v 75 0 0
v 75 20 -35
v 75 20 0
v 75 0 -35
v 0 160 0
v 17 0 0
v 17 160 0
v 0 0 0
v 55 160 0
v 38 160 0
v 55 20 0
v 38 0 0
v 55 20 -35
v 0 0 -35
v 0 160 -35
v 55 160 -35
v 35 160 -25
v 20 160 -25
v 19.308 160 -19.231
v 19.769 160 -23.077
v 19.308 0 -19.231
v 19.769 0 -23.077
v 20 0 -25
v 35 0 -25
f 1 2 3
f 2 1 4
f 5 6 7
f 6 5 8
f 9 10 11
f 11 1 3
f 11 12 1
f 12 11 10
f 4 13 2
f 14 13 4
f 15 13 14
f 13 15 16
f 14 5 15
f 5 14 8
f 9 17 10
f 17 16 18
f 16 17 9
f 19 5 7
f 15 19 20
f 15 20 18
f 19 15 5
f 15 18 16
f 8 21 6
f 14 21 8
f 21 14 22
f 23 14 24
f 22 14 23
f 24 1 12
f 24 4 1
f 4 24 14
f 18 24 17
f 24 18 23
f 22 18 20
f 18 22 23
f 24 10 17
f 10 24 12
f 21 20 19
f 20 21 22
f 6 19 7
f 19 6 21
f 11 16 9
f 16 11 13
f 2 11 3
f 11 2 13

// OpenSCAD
mr = 40; // margin between the slot and the wall
ml = 20;
sw = 15; // slot width

d = 160; // depth of the extrude
bh = 10; // height below the slot
sh = 25; // height of the slot

module block(bh){
    difference() {
        translate([0,0,-bh-sh]) cube([mr+ml+sw, d, bh+sh]);
        translate([ml,0,-sh]) translate([sw/2,d/2,0]) 
            linear_extrude(height=sh, scale=[1.4,1]) 
                square([sw, d], center=true);
        
        fd = 20; // depth of flat lower part of the stand
        translate([ml+sw+ml,fd, -bh-sh]) cube([mr+ml+sw, d, bh+sh]);
    }
}

block(bh);
